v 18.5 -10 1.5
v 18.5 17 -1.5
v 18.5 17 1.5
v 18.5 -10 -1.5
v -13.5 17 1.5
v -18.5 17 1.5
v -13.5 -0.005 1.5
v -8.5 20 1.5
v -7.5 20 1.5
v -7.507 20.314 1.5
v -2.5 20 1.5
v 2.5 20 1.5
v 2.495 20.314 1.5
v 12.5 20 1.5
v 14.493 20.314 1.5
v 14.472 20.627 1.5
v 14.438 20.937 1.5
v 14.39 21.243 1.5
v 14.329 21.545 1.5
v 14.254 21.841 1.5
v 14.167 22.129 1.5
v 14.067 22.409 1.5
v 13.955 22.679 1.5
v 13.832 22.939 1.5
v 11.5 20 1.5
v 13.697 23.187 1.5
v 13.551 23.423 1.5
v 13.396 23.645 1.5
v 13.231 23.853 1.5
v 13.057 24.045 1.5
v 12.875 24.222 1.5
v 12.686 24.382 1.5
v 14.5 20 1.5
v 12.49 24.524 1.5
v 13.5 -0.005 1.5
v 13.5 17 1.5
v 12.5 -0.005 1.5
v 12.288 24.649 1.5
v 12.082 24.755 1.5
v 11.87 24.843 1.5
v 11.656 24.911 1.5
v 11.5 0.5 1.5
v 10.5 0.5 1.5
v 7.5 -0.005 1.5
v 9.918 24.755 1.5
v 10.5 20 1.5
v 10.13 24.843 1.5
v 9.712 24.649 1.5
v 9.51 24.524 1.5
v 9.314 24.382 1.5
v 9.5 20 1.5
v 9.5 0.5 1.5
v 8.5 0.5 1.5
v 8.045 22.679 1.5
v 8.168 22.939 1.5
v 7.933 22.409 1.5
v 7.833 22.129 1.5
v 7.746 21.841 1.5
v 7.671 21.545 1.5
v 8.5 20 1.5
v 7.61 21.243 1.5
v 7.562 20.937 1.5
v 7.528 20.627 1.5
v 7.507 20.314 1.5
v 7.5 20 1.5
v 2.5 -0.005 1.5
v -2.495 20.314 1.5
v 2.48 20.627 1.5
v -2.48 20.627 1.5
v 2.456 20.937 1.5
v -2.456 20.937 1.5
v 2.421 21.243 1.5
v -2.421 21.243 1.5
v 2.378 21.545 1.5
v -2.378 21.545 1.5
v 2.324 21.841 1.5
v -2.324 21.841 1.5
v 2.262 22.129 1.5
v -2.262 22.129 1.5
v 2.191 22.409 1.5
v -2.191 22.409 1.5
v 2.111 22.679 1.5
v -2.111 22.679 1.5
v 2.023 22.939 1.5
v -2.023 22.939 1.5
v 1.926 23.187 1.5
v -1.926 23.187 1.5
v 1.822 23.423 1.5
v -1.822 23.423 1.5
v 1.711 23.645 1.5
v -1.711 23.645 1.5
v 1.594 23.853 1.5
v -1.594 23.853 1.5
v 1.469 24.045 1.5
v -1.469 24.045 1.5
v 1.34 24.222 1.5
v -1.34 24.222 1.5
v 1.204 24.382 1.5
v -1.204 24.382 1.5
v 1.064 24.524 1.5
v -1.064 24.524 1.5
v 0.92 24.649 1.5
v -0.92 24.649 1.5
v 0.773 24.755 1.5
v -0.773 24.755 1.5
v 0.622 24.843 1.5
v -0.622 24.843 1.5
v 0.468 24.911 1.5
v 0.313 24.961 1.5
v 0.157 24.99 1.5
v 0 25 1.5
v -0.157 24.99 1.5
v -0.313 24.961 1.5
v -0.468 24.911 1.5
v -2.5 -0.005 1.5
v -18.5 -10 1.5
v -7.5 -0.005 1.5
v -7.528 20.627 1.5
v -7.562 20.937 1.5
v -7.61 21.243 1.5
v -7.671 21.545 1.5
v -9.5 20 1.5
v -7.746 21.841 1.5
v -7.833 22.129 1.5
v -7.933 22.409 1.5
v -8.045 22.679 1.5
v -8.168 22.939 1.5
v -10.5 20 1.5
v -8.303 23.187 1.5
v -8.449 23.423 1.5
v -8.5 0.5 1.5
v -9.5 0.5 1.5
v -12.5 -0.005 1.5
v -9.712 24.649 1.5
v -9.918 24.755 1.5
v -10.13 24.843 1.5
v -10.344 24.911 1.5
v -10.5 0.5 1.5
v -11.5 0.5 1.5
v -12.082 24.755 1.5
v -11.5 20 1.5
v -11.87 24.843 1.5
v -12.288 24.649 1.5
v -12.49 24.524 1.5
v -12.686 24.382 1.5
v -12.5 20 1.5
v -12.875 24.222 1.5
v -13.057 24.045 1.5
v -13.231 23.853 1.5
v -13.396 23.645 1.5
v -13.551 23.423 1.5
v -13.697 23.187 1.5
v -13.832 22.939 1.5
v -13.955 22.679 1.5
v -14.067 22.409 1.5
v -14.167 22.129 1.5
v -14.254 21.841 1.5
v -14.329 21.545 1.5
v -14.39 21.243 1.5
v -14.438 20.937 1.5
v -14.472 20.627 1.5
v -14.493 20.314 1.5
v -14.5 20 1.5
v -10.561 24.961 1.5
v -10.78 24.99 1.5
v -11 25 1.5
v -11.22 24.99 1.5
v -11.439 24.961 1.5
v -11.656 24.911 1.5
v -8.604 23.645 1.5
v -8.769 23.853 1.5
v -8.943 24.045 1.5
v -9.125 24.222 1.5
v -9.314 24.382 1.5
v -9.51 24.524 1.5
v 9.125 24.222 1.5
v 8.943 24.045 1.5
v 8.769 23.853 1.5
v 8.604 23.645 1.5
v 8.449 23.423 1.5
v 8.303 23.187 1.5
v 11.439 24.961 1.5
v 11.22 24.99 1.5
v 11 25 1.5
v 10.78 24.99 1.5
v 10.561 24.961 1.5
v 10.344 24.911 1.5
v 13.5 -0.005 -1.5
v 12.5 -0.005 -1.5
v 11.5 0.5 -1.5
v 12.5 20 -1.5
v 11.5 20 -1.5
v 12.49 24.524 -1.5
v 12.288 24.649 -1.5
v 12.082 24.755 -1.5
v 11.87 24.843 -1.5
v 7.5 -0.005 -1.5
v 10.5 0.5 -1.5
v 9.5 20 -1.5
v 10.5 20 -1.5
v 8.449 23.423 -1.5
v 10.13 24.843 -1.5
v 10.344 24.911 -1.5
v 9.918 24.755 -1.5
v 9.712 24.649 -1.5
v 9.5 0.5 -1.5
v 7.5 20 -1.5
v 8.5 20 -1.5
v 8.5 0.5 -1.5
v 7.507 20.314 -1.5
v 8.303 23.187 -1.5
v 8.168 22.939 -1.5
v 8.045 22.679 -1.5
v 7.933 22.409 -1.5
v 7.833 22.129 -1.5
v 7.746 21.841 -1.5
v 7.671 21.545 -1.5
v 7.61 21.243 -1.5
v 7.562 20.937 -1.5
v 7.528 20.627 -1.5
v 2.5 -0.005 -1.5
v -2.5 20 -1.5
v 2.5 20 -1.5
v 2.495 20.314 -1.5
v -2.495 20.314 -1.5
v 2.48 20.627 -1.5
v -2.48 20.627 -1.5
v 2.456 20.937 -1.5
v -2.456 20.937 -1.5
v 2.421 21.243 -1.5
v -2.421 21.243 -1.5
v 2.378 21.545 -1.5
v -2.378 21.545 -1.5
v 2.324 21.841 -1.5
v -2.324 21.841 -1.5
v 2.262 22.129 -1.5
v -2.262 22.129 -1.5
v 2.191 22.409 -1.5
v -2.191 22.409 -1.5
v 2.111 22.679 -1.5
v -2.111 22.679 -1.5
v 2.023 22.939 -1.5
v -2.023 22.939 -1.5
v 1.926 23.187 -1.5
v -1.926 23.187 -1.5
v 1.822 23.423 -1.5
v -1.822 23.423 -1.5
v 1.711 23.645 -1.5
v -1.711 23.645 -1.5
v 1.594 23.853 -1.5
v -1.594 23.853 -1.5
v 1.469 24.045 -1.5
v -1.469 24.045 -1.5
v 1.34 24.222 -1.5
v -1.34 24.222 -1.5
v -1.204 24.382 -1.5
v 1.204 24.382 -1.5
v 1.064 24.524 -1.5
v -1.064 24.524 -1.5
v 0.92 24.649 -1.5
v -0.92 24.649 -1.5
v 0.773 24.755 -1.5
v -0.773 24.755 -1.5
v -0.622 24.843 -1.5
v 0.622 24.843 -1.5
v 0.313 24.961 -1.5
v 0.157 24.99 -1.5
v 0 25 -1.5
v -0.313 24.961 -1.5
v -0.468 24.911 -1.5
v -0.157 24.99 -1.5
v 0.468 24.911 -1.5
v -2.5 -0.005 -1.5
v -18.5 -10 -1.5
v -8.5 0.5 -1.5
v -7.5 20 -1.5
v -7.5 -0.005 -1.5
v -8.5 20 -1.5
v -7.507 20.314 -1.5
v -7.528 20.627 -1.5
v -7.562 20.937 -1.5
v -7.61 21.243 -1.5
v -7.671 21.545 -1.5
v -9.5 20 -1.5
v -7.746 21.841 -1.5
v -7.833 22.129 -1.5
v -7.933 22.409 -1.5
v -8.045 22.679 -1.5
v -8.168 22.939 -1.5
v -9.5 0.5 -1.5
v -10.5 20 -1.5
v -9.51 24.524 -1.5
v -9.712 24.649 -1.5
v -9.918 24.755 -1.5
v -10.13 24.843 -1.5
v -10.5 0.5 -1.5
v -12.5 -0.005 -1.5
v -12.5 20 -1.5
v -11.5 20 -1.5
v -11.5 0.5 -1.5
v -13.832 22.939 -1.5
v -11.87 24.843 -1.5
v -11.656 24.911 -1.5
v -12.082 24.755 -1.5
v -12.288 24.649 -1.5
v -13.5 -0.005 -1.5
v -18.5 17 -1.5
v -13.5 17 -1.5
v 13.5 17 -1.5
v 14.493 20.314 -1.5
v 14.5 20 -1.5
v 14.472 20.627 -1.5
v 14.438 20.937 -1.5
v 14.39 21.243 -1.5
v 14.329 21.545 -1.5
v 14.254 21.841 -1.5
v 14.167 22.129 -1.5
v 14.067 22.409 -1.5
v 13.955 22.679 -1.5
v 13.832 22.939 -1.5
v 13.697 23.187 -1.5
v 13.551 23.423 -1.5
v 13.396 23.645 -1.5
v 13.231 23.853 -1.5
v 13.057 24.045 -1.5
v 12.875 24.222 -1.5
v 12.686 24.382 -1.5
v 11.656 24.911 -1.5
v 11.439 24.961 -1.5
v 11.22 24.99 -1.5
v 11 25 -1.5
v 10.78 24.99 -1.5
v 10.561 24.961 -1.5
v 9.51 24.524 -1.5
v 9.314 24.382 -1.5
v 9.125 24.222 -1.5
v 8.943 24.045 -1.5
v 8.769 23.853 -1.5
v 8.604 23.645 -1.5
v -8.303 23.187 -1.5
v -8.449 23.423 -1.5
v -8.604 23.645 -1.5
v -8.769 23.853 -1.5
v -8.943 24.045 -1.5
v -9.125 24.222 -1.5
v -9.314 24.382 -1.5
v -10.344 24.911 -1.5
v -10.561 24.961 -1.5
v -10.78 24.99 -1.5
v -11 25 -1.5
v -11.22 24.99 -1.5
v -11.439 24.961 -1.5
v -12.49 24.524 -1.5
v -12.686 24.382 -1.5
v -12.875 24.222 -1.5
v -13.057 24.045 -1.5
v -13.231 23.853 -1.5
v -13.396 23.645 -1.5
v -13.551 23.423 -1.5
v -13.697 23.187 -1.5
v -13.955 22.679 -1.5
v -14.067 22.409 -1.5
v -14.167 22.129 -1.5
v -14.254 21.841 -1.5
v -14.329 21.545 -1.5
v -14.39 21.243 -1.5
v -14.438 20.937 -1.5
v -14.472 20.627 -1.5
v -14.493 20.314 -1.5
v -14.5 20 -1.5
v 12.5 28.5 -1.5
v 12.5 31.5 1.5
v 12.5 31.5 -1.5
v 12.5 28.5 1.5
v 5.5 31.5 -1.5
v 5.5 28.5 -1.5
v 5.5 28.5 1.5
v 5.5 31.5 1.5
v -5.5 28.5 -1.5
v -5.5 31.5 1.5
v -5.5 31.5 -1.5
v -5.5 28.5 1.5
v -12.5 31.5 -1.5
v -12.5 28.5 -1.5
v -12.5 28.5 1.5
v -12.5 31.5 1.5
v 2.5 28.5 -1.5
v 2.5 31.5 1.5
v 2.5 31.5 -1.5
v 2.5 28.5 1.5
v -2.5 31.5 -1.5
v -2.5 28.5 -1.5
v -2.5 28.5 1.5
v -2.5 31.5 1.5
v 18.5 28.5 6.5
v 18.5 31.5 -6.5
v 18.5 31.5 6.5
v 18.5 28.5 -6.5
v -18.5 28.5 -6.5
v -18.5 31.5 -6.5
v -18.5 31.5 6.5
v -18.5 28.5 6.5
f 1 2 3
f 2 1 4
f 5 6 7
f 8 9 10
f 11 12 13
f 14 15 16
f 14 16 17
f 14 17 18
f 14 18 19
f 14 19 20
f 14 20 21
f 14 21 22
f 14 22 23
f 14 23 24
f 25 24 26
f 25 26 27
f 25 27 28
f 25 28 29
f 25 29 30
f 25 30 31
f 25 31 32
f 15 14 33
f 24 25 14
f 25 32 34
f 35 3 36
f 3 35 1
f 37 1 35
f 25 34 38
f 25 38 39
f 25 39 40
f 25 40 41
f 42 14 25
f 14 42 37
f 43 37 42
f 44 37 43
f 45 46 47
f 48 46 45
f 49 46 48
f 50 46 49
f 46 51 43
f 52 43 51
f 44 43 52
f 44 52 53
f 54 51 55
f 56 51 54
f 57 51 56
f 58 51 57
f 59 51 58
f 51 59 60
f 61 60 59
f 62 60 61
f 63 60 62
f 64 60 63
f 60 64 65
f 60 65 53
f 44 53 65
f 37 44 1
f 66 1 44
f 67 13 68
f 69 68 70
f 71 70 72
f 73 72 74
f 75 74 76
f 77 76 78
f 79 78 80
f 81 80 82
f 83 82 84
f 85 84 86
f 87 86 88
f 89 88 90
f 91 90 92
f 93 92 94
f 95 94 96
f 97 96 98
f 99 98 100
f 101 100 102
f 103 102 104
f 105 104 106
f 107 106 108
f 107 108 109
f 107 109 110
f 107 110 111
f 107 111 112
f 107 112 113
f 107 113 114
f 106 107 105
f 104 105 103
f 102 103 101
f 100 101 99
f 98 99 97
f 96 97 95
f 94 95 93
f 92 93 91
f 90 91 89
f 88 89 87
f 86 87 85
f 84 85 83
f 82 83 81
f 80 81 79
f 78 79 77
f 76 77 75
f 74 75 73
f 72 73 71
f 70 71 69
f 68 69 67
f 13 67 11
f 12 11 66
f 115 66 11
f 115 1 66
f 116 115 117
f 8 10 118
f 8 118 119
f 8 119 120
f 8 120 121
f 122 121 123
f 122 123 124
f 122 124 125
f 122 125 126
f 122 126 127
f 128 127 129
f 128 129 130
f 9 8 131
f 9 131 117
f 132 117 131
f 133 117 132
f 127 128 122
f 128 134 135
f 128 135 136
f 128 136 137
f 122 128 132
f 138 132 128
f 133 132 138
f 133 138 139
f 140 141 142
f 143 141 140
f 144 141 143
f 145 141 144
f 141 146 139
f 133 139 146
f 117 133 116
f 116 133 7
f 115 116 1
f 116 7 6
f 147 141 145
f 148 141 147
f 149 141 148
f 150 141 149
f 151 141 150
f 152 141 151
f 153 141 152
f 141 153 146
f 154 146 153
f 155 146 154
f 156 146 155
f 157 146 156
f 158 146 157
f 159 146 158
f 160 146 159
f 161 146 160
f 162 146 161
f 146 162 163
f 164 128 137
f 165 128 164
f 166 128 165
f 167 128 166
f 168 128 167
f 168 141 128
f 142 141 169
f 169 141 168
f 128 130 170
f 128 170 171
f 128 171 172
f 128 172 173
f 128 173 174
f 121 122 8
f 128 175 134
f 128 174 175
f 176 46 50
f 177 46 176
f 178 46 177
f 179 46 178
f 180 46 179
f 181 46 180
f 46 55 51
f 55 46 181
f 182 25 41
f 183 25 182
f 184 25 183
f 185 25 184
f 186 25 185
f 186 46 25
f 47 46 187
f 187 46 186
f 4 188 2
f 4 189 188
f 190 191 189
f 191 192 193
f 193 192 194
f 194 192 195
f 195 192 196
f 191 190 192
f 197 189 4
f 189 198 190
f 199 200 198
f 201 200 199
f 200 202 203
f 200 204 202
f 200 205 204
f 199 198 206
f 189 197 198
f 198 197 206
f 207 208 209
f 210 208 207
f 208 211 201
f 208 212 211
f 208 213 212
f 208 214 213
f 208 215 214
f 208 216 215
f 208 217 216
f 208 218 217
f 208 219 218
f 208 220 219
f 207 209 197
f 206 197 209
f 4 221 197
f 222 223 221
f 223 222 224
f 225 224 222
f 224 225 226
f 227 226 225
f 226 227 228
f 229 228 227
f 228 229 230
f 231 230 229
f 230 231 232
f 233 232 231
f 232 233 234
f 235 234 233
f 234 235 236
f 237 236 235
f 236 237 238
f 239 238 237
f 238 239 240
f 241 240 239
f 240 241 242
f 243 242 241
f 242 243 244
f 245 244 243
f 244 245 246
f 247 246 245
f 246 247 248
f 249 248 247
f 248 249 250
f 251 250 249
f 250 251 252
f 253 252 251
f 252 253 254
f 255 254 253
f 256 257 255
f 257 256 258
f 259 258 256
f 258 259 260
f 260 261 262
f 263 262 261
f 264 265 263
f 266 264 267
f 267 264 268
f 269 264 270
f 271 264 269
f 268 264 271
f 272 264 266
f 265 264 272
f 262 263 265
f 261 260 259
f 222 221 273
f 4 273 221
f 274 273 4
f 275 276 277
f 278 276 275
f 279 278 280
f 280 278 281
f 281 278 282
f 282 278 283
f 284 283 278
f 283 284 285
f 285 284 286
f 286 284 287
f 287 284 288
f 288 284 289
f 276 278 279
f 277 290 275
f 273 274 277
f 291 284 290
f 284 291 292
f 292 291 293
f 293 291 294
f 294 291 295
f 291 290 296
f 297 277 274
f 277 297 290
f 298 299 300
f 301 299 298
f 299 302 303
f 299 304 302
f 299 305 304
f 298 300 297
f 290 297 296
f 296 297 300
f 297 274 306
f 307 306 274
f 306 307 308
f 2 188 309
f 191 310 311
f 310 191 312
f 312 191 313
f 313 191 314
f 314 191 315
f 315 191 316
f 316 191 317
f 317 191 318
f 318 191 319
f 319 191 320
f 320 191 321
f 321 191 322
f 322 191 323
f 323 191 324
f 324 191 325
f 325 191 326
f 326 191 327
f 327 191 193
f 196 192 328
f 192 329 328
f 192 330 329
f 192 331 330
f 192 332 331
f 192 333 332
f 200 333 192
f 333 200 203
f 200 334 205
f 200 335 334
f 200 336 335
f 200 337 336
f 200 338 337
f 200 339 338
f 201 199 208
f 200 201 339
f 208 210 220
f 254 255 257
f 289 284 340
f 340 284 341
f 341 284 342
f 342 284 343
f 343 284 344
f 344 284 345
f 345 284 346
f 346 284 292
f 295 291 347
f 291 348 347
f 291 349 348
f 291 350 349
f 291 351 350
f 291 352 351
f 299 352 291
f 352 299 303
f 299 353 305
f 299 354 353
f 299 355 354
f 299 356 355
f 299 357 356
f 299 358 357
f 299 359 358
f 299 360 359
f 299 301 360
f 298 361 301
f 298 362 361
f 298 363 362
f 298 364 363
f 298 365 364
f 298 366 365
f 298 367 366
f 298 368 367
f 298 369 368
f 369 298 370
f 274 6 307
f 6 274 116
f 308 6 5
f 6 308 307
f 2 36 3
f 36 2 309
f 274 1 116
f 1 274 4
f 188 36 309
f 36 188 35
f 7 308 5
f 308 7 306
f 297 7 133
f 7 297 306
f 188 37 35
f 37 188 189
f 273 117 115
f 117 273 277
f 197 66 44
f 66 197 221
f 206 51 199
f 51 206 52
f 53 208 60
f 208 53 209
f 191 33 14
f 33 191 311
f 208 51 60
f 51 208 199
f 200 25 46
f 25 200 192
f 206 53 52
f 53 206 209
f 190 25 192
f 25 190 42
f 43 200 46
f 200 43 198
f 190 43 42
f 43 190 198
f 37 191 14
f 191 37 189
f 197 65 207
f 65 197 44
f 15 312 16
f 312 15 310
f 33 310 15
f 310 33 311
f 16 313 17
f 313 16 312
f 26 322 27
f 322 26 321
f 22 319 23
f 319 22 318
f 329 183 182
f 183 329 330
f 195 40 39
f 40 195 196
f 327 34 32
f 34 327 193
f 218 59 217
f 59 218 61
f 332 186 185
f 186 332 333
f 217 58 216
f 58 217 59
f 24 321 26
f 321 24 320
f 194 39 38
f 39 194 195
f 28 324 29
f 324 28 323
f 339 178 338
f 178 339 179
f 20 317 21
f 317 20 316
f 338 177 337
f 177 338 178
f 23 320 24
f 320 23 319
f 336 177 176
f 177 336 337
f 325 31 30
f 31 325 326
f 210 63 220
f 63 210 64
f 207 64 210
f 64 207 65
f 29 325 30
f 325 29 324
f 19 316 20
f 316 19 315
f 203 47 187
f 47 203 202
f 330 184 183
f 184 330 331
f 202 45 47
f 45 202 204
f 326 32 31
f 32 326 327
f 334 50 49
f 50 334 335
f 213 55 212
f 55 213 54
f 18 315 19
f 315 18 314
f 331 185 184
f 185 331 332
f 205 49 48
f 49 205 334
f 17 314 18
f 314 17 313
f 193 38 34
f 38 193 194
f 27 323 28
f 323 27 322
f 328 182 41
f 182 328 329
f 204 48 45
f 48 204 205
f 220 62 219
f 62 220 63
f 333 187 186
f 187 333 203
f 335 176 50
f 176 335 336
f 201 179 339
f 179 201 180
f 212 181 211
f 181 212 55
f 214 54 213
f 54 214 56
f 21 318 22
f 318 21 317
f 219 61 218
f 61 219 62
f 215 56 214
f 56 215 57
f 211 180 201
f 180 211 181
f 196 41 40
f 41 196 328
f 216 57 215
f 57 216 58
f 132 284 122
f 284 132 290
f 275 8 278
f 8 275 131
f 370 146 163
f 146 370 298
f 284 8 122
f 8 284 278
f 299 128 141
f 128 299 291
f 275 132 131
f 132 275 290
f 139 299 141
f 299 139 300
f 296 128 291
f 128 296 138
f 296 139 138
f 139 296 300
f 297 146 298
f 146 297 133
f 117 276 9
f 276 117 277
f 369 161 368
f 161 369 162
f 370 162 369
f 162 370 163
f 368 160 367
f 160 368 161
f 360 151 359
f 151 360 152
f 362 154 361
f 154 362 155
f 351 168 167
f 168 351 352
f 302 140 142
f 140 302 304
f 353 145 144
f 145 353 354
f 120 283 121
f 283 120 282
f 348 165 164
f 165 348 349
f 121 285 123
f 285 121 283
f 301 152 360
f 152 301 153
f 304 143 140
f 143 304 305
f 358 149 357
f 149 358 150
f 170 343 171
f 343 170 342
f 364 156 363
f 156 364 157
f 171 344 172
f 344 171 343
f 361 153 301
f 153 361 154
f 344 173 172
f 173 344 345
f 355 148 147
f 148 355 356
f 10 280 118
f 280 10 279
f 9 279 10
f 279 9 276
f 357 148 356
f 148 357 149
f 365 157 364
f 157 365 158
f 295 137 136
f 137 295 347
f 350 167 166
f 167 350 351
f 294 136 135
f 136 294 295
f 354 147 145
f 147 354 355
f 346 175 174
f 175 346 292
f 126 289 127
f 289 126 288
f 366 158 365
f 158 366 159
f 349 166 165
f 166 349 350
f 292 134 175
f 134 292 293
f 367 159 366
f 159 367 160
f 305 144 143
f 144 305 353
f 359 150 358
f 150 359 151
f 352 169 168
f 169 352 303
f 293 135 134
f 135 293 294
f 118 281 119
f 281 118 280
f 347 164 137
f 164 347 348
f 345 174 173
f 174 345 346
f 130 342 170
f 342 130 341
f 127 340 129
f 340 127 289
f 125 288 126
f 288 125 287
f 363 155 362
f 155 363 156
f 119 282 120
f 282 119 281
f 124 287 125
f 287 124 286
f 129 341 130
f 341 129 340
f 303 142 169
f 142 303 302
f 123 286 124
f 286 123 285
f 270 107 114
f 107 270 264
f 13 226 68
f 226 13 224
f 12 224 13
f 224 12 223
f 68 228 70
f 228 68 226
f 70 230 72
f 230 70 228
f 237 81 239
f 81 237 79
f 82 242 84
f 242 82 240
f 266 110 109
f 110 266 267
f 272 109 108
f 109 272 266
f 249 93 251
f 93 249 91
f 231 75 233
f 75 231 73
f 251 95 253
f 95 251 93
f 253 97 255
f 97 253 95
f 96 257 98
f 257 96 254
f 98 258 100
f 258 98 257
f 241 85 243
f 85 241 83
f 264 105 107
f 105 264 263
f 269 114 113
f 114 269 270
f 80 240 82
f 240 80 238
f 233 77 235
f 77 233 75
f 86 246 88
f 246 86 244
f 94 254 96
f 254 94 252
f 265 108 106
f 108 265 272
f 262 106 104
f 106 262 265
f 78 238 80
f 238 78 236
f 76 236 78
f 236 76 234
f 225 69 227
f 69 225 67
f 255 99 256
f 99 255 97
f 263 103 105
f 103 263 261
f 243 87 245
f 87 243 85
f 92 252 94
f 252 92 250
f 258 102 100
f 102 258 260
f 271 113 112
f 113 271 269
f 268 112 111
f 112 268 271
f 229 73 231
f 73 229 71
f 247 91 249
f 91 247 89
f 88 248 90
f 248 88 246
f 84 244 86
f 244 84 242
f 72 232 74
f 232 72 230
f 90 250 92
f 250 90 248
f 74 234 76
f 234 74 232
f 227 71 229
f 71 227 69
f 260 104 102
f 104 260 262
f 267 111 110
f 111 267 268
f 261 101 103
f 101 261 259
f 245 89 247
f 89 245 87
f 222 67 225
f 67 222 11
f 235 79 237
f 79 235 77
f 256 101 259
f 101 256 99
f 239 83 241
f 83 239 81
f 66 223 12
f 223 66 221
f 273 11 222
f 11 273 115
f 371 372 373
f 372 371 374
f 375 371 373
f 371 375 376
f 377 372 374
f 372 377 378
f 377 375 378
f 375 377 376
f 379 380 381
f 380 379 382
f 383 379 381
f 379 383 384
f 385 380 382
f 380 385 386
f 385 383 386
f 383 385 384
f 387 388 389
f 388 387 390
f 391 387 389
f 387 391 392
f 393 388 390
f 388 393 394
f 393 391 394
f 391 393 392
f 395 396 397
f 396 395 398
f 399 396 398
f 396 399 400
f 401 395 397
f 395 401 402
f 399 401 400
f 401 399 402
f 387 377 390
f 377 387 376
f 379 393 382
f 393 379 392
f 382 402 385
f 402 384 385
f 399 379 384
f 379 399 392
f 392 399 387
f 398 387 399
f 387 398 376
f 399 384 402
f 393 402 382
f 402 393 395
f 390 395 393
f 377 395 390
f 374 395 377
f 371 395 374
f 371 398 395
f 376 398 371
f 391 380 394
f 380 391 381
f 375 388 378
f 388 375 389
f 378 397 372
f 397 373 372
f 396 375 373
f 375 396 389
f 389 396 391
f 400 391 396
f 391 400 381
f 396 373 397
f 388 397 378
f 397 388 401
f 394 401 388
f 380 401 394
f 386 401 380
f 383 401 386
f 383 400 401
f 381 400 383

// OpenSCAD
// file: snap-feather.scad
include <config.scad>;


module snap_feather(
            width,
            height,
            hook_width,
            hook_height,
            hook_cutaway,
            leg_count=3,
            base_height
            )
{
    // feather leg(s)
    difference()
    {
        translate([
            width/2,
            (height-hook_height)/2 - nothing,
            0
            ])
        cube([
            width,
            height - hook_height + 2*nothing,
            material_z
            ], center=true);

        leg_width = width/(2*leg_count-1);
        leg_height = height - hook_height - base_height;
        for (i=[1:leg_count-1])
        {
            translate([
                leg_width/2 + (i*2-1)*leg_width,
                leg_height/2 + base_height,
                0
                ])
            cube([
                leg_width,
                leg_height,
                material_z + 2*nothing
                ], center=true);
        }
    }

    // feather head
    translate([0, height-hook_height, 0])
    intersection()
    {
        translate([0, 0, -material_z/2])
        cube([width+hook_width, hook_height, material_z]);

        translate([(width+hook_width)/2, 0, 0])
        scale([(width+hook_width)/2, hook_height, 1])
        cylinder(r=1, h=material_z, center=true);
    }
}

snap_feather(
    width=5,
    height=40,
    hook_width=3,
    hook_height=5,
    hook_cutaway=4,
    leg_width=2,
    leg_count=3,
    base_height=3
    );
// file: snap-nut.scad
include <config.scad>;

module snap_nut_cutout(
            width = snap_joint_width,
            feather_width = snap_joint_feather_width,
            feather_hook_width = snap_joint_feather_hook_width,
            stick_width = snap_joint_stick_width
            )
{
    translate([
        width/2 - feather_width/2 - feather_hook_width/2,
        0,
        0
        ])
    cube([
        feather_width + feather_hook_width,
        material_z*2,
        material_z
        ], center=true);

    translate([
        -width/2 + feather_width/2 + feather_hook_width/2,
        0,
        0
        ])
    cube([
        feather_width + feather_hook_width,
        material_z*2,
        material_z
        ], center=true);

    cube([
        stick_width,
        material_z*2,
        material_z
        ], center=true);
}

snap_nut_cutout();
// file: snap-joint.scad
include <config.scad>;
use <snap-feather.scad>;

module snap_joint(
            width = snap_joint_width,
            height = snap_joint_height,
            feather_width = snap_joint_feather_width,
            feather_hook_width = snap_joint_feather_hook_width,
            feather_hook_height = snap_joint_feather_hook_height,
            feather_hook_cutaway = snap_joint_feather_hook_cutaway,
            feather_base_height = snap_joint_feather_base_height,
            stick_width = snap_joint_stick_width
            )
{
    translate([width/2 - feather_width, 0, 0])
    snap_feather(
        width = feather_width,
        height = height,
        hook_width = feather_hook_width,
        hook_height = feather_hook_height,
        hook_cutaway  = feather_hook_cutaway,
        base_height = feather_base_height
        );

    translate([-width/2 + feather_width, 0, 0])
    rotate([0, 180, 0])
    snap_feather(
        width = feather_width,
        height = height,
        hook_width = feather_hook_width,
        hook_height = feather_hook_height,
        hook_cutaway  = feather_hook_cutaway,
        base_height = feather_base_height
        );

    translate([0, (height-feather_hook_height)/2 - nothing, 0])
    cube([stick_width, height - feather_hook_height + 2*nothing, material_z], center=true);

    translate([0, height-feather_hook_height, 0])
    intersection()
    {
        translate([0, feather_hook_height/2, 0])
        cube([stick_width, feather_hook_height, material_z], center=true);

        scale([stick_width/2, feather_hook_height, 1])
        cylinder(r=1, h=material_z, center=true);
    }
}

snap_joint();
// file: config.scad
$fn = 100;
nothing = 0.01;

material_z = 3;

snap_joint_width = 25;
snap_joint_height = 25;
snap_joint_feather_width = 5;
snap_joint_feather_hook_width = 2;
snap_joint_feather_hook_height = 5;
snap_joint_feather_hook_cutaway = 3;
snap_joint_feather_base_height = 0.5;
snap_joint_stick_width = 5;
// main file
include <config.scad>;
use <snap-joint.scad>;
use <snap-nut.scad>;

module test_joint()
{
    difference()
    {
        y = snap_joint_height - snap_joint_feather_hook_height - material_z;
        d = 10;
        translate([0, y/2 - d/2, 0])
        cube([
            snap_joint_width + snap_joint_feather_hook_width + 10,
            y + d,
            material_z
            ], center=true);

        translate([0, y/2, 0])
        cube([
            snap_joint_width + 2,
            y + nothing,
            material_z + nothing
            ], center=true);
    }
    snap_joint();
}

module test_nut()
{
    rotate([90, 0, 0])
    difference()
    {
        cube([
            snap_joint_width + snap_joint_feather_hook_width + 10,
            material_z,
            material_z + 10
            ], center=true);
        snap_nut_cutout();
    }
}


test_joint();

translate([0, snap_joint_height+5, 0])
rotate([90, 0, 0])
test_nut();
